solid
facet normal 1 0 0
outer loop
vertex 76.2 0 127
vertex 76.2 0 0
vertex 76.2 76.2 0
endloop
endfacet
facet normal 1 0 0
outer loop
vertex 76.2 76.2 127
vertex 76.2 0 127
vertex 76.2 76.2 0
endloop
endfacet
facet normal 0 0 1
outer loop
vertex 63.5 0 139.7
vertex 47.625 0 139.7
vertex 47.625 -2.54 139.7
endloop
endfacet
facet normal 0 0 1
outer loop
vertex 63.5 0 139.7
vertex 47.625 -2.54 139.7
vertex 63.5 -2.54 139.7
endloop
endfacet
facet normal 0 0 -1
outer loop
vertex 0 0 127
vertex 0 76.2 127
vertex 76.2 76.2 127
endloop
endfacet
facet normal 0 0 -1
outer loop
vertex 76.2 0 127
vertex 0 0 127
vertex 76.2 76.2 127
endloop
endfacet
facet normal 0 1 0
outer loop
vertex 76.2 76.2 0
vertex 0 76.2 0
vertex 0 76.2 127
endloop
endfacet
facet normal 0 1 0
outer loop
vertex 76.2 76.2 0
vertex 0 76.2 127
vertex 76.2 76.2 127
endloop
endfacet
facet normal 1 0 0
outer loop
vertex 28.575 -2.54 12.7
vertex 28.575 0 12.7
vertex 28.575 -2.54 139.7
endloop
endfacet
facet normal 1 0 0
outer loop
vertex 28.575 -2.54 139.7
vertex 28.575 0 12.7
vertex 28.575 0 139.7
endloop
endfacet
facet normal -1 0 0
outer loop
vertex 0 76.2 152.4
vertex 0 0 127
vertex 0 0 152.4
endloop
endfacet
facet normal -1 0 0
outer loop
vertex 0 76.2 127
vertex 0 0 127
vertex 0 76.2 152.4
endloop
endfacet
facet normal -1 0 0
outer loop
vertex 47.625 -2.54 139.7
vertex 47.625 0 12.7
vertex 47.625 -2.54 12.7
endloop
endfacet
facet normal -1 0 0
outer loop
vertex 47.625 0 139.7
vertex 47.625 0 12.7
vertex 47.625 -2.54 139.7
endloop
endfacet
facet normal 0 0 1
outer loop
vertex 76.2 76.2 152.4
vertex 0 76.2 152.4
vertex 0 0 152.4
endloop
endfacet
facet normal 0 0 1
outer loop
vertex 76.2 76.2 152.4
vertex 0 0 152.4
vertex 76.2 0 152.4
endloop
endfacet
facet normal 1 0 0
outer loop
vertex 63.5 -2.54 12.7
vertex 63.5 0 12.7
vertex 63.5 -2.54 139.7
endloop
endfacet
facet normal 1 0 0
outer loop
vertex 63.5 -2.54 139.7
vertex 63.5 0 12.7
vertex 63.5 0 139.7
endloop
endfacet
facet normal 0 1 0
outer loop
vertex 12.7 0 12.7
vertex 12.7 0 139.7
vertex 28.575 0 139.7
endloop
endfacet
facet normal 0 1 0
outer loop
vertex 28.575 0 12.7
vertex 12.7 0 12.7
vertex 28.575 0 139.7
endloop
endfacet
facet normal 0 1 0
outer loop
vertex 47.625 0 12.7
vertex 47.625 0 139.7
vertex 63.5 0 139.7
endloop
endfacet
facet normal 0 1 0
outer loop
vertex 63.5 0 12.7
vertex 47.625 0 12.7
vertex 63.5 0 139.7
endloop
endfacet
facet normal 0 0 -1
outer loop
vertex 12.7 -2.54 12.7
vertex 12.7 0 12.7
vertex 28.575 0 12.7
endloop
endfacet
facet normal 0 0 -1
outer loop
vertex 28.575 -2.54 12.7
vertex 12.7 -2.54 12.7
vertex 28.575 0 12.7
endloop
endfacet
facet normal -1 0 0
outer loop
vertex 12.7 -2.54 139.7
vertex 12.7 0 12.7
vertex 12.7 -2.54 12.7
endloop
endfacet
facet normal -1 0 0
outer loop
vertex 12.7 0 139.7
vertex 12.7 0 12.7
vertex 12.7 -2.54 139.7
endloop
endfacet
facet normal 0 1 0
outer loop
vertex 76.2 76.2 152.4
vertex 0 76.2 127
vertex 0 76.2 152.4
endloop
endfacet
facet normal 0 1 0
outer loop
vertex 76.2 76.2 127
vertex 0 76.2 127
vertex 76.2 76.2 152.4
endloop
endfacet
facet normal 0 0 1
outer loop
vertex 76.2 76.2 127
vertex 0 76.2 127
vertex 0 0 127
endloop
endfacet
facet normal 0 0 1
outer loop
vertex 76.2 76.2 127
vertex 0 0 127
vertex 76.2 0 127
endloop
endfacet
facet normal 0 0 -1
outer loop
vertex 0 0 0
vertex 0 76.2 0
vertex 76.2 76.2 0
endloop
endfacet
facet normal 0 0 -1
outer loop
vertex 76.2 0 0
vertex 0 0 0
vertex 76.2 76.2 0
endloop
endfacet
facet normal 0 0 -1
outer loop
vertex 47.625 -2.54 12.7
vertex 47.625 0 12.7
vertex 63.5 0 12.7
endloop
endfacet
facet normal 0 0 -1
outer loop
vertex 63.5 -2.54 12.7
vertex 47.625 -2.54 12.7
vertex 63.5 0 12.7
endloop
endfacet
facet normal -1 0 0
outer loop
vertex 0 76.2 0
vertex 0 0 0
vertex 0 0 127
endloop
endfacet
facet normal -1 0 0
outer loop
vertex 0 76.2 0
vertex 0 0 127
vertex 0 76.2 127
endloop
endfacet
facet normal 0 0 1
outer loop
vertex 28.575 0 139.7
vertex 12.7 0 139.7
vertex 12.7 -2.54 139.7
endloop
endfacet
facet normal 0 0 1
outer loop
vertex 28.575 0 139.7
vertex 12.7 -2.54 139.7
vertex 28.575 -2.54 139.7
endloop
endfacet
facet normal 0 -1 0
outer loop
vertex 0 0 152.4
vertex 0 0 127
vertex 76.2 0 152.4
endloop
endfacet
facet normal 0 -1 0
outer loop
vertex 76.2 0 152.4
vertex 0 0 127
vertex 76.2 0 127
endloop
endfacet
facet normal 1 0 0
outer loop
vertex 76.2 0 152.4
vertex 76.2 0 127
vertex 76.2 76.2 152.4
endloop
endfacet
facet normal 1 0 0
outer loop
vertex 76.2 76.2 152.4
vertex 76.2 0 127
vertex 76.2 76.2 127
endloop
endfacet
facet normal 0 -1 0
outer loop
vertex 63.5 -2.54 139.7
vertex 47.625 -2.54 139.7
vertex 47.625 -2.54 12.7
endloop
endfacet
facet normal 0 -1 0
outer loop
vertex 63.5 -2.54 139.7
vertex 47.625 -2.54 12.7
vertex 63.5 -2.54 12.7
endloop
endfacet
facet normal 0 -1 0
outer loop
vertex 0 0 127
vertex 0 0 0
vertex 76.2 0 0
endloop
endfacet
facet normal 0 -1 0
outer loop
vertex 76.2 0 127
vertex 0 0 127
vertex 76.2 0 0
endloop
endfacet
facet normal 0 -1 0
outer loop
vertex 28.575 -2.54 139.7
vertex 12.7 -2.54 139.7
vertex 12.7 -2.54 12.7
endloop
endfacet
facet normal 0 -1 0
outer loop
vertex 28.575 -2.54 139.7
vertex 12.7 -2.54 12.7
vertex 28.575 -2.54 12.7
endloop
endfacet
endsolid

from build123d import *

# Parameters (mm, degrees)
SKETCH1_W             = 76.2
SKETCH1_H             = 76.2
BOSS_EXTRUDE1_DEPTH   = 127
SKETCH4_W             = 76.2
SKETCH4_H             = 76.2
BOSS_EXTRUDE4_DEPTH   = 25.4
SKETCH2_W             = 15.875
SKETCH2_H             = 127
BOSS_EXTRUDE3_DEPTH   = 2.54
BOSS_EXTRUDE3_2_DEPTH = 2.54


with BuildPart() as part:
    # Sketch1 → Boss-Extrude1 (new body)
    with BuildSketch(Plane.XY):
        with Locations((38.1, 38.1)):
            Rectangle(SKETCH1_W, SKETCH1_H)
    extrude(amount=BOSS_EXTRUDE1_DEPTH)


with BuildPart() as body_2:
    # Sketch4 → Boss-Extrude4 (new body)
    with BuildSketch(Plane.XY.offset(127)):
        with Locations((38.1, 38.1)):
            Rectangle(SKETCH4_W, SKETCH4_H)
    extrude(amount=BOSS_EXTRUDE4_DEPTH)


with BuildPart() as body_3:
    # Sketch2 → Boss-Extrude3 (new body)
    with BuildSketch(Plane.XZ):
        with Locations((20.6375, 76.2)):
            Rectangle(SKETCH2_W, SKETCH2_H)
    extrude(amount=BOSS_EXTRUDE3_DEPTH)


with BuildPart() as body_4:
    # Sketch2 → Boss-Extrude3 2 (new body)
    with BuildSketch(Plane.XZ):
        with Locations((55.5625, 76.2)):
            Rectangle(SKETCH2_W, SKETCH2_H)
    extrude(amount=BOSS_EXTRUDE3_2_DEPTH)


solid = Compound([part.part, body_2.part, body_3.part, body_4.part])
